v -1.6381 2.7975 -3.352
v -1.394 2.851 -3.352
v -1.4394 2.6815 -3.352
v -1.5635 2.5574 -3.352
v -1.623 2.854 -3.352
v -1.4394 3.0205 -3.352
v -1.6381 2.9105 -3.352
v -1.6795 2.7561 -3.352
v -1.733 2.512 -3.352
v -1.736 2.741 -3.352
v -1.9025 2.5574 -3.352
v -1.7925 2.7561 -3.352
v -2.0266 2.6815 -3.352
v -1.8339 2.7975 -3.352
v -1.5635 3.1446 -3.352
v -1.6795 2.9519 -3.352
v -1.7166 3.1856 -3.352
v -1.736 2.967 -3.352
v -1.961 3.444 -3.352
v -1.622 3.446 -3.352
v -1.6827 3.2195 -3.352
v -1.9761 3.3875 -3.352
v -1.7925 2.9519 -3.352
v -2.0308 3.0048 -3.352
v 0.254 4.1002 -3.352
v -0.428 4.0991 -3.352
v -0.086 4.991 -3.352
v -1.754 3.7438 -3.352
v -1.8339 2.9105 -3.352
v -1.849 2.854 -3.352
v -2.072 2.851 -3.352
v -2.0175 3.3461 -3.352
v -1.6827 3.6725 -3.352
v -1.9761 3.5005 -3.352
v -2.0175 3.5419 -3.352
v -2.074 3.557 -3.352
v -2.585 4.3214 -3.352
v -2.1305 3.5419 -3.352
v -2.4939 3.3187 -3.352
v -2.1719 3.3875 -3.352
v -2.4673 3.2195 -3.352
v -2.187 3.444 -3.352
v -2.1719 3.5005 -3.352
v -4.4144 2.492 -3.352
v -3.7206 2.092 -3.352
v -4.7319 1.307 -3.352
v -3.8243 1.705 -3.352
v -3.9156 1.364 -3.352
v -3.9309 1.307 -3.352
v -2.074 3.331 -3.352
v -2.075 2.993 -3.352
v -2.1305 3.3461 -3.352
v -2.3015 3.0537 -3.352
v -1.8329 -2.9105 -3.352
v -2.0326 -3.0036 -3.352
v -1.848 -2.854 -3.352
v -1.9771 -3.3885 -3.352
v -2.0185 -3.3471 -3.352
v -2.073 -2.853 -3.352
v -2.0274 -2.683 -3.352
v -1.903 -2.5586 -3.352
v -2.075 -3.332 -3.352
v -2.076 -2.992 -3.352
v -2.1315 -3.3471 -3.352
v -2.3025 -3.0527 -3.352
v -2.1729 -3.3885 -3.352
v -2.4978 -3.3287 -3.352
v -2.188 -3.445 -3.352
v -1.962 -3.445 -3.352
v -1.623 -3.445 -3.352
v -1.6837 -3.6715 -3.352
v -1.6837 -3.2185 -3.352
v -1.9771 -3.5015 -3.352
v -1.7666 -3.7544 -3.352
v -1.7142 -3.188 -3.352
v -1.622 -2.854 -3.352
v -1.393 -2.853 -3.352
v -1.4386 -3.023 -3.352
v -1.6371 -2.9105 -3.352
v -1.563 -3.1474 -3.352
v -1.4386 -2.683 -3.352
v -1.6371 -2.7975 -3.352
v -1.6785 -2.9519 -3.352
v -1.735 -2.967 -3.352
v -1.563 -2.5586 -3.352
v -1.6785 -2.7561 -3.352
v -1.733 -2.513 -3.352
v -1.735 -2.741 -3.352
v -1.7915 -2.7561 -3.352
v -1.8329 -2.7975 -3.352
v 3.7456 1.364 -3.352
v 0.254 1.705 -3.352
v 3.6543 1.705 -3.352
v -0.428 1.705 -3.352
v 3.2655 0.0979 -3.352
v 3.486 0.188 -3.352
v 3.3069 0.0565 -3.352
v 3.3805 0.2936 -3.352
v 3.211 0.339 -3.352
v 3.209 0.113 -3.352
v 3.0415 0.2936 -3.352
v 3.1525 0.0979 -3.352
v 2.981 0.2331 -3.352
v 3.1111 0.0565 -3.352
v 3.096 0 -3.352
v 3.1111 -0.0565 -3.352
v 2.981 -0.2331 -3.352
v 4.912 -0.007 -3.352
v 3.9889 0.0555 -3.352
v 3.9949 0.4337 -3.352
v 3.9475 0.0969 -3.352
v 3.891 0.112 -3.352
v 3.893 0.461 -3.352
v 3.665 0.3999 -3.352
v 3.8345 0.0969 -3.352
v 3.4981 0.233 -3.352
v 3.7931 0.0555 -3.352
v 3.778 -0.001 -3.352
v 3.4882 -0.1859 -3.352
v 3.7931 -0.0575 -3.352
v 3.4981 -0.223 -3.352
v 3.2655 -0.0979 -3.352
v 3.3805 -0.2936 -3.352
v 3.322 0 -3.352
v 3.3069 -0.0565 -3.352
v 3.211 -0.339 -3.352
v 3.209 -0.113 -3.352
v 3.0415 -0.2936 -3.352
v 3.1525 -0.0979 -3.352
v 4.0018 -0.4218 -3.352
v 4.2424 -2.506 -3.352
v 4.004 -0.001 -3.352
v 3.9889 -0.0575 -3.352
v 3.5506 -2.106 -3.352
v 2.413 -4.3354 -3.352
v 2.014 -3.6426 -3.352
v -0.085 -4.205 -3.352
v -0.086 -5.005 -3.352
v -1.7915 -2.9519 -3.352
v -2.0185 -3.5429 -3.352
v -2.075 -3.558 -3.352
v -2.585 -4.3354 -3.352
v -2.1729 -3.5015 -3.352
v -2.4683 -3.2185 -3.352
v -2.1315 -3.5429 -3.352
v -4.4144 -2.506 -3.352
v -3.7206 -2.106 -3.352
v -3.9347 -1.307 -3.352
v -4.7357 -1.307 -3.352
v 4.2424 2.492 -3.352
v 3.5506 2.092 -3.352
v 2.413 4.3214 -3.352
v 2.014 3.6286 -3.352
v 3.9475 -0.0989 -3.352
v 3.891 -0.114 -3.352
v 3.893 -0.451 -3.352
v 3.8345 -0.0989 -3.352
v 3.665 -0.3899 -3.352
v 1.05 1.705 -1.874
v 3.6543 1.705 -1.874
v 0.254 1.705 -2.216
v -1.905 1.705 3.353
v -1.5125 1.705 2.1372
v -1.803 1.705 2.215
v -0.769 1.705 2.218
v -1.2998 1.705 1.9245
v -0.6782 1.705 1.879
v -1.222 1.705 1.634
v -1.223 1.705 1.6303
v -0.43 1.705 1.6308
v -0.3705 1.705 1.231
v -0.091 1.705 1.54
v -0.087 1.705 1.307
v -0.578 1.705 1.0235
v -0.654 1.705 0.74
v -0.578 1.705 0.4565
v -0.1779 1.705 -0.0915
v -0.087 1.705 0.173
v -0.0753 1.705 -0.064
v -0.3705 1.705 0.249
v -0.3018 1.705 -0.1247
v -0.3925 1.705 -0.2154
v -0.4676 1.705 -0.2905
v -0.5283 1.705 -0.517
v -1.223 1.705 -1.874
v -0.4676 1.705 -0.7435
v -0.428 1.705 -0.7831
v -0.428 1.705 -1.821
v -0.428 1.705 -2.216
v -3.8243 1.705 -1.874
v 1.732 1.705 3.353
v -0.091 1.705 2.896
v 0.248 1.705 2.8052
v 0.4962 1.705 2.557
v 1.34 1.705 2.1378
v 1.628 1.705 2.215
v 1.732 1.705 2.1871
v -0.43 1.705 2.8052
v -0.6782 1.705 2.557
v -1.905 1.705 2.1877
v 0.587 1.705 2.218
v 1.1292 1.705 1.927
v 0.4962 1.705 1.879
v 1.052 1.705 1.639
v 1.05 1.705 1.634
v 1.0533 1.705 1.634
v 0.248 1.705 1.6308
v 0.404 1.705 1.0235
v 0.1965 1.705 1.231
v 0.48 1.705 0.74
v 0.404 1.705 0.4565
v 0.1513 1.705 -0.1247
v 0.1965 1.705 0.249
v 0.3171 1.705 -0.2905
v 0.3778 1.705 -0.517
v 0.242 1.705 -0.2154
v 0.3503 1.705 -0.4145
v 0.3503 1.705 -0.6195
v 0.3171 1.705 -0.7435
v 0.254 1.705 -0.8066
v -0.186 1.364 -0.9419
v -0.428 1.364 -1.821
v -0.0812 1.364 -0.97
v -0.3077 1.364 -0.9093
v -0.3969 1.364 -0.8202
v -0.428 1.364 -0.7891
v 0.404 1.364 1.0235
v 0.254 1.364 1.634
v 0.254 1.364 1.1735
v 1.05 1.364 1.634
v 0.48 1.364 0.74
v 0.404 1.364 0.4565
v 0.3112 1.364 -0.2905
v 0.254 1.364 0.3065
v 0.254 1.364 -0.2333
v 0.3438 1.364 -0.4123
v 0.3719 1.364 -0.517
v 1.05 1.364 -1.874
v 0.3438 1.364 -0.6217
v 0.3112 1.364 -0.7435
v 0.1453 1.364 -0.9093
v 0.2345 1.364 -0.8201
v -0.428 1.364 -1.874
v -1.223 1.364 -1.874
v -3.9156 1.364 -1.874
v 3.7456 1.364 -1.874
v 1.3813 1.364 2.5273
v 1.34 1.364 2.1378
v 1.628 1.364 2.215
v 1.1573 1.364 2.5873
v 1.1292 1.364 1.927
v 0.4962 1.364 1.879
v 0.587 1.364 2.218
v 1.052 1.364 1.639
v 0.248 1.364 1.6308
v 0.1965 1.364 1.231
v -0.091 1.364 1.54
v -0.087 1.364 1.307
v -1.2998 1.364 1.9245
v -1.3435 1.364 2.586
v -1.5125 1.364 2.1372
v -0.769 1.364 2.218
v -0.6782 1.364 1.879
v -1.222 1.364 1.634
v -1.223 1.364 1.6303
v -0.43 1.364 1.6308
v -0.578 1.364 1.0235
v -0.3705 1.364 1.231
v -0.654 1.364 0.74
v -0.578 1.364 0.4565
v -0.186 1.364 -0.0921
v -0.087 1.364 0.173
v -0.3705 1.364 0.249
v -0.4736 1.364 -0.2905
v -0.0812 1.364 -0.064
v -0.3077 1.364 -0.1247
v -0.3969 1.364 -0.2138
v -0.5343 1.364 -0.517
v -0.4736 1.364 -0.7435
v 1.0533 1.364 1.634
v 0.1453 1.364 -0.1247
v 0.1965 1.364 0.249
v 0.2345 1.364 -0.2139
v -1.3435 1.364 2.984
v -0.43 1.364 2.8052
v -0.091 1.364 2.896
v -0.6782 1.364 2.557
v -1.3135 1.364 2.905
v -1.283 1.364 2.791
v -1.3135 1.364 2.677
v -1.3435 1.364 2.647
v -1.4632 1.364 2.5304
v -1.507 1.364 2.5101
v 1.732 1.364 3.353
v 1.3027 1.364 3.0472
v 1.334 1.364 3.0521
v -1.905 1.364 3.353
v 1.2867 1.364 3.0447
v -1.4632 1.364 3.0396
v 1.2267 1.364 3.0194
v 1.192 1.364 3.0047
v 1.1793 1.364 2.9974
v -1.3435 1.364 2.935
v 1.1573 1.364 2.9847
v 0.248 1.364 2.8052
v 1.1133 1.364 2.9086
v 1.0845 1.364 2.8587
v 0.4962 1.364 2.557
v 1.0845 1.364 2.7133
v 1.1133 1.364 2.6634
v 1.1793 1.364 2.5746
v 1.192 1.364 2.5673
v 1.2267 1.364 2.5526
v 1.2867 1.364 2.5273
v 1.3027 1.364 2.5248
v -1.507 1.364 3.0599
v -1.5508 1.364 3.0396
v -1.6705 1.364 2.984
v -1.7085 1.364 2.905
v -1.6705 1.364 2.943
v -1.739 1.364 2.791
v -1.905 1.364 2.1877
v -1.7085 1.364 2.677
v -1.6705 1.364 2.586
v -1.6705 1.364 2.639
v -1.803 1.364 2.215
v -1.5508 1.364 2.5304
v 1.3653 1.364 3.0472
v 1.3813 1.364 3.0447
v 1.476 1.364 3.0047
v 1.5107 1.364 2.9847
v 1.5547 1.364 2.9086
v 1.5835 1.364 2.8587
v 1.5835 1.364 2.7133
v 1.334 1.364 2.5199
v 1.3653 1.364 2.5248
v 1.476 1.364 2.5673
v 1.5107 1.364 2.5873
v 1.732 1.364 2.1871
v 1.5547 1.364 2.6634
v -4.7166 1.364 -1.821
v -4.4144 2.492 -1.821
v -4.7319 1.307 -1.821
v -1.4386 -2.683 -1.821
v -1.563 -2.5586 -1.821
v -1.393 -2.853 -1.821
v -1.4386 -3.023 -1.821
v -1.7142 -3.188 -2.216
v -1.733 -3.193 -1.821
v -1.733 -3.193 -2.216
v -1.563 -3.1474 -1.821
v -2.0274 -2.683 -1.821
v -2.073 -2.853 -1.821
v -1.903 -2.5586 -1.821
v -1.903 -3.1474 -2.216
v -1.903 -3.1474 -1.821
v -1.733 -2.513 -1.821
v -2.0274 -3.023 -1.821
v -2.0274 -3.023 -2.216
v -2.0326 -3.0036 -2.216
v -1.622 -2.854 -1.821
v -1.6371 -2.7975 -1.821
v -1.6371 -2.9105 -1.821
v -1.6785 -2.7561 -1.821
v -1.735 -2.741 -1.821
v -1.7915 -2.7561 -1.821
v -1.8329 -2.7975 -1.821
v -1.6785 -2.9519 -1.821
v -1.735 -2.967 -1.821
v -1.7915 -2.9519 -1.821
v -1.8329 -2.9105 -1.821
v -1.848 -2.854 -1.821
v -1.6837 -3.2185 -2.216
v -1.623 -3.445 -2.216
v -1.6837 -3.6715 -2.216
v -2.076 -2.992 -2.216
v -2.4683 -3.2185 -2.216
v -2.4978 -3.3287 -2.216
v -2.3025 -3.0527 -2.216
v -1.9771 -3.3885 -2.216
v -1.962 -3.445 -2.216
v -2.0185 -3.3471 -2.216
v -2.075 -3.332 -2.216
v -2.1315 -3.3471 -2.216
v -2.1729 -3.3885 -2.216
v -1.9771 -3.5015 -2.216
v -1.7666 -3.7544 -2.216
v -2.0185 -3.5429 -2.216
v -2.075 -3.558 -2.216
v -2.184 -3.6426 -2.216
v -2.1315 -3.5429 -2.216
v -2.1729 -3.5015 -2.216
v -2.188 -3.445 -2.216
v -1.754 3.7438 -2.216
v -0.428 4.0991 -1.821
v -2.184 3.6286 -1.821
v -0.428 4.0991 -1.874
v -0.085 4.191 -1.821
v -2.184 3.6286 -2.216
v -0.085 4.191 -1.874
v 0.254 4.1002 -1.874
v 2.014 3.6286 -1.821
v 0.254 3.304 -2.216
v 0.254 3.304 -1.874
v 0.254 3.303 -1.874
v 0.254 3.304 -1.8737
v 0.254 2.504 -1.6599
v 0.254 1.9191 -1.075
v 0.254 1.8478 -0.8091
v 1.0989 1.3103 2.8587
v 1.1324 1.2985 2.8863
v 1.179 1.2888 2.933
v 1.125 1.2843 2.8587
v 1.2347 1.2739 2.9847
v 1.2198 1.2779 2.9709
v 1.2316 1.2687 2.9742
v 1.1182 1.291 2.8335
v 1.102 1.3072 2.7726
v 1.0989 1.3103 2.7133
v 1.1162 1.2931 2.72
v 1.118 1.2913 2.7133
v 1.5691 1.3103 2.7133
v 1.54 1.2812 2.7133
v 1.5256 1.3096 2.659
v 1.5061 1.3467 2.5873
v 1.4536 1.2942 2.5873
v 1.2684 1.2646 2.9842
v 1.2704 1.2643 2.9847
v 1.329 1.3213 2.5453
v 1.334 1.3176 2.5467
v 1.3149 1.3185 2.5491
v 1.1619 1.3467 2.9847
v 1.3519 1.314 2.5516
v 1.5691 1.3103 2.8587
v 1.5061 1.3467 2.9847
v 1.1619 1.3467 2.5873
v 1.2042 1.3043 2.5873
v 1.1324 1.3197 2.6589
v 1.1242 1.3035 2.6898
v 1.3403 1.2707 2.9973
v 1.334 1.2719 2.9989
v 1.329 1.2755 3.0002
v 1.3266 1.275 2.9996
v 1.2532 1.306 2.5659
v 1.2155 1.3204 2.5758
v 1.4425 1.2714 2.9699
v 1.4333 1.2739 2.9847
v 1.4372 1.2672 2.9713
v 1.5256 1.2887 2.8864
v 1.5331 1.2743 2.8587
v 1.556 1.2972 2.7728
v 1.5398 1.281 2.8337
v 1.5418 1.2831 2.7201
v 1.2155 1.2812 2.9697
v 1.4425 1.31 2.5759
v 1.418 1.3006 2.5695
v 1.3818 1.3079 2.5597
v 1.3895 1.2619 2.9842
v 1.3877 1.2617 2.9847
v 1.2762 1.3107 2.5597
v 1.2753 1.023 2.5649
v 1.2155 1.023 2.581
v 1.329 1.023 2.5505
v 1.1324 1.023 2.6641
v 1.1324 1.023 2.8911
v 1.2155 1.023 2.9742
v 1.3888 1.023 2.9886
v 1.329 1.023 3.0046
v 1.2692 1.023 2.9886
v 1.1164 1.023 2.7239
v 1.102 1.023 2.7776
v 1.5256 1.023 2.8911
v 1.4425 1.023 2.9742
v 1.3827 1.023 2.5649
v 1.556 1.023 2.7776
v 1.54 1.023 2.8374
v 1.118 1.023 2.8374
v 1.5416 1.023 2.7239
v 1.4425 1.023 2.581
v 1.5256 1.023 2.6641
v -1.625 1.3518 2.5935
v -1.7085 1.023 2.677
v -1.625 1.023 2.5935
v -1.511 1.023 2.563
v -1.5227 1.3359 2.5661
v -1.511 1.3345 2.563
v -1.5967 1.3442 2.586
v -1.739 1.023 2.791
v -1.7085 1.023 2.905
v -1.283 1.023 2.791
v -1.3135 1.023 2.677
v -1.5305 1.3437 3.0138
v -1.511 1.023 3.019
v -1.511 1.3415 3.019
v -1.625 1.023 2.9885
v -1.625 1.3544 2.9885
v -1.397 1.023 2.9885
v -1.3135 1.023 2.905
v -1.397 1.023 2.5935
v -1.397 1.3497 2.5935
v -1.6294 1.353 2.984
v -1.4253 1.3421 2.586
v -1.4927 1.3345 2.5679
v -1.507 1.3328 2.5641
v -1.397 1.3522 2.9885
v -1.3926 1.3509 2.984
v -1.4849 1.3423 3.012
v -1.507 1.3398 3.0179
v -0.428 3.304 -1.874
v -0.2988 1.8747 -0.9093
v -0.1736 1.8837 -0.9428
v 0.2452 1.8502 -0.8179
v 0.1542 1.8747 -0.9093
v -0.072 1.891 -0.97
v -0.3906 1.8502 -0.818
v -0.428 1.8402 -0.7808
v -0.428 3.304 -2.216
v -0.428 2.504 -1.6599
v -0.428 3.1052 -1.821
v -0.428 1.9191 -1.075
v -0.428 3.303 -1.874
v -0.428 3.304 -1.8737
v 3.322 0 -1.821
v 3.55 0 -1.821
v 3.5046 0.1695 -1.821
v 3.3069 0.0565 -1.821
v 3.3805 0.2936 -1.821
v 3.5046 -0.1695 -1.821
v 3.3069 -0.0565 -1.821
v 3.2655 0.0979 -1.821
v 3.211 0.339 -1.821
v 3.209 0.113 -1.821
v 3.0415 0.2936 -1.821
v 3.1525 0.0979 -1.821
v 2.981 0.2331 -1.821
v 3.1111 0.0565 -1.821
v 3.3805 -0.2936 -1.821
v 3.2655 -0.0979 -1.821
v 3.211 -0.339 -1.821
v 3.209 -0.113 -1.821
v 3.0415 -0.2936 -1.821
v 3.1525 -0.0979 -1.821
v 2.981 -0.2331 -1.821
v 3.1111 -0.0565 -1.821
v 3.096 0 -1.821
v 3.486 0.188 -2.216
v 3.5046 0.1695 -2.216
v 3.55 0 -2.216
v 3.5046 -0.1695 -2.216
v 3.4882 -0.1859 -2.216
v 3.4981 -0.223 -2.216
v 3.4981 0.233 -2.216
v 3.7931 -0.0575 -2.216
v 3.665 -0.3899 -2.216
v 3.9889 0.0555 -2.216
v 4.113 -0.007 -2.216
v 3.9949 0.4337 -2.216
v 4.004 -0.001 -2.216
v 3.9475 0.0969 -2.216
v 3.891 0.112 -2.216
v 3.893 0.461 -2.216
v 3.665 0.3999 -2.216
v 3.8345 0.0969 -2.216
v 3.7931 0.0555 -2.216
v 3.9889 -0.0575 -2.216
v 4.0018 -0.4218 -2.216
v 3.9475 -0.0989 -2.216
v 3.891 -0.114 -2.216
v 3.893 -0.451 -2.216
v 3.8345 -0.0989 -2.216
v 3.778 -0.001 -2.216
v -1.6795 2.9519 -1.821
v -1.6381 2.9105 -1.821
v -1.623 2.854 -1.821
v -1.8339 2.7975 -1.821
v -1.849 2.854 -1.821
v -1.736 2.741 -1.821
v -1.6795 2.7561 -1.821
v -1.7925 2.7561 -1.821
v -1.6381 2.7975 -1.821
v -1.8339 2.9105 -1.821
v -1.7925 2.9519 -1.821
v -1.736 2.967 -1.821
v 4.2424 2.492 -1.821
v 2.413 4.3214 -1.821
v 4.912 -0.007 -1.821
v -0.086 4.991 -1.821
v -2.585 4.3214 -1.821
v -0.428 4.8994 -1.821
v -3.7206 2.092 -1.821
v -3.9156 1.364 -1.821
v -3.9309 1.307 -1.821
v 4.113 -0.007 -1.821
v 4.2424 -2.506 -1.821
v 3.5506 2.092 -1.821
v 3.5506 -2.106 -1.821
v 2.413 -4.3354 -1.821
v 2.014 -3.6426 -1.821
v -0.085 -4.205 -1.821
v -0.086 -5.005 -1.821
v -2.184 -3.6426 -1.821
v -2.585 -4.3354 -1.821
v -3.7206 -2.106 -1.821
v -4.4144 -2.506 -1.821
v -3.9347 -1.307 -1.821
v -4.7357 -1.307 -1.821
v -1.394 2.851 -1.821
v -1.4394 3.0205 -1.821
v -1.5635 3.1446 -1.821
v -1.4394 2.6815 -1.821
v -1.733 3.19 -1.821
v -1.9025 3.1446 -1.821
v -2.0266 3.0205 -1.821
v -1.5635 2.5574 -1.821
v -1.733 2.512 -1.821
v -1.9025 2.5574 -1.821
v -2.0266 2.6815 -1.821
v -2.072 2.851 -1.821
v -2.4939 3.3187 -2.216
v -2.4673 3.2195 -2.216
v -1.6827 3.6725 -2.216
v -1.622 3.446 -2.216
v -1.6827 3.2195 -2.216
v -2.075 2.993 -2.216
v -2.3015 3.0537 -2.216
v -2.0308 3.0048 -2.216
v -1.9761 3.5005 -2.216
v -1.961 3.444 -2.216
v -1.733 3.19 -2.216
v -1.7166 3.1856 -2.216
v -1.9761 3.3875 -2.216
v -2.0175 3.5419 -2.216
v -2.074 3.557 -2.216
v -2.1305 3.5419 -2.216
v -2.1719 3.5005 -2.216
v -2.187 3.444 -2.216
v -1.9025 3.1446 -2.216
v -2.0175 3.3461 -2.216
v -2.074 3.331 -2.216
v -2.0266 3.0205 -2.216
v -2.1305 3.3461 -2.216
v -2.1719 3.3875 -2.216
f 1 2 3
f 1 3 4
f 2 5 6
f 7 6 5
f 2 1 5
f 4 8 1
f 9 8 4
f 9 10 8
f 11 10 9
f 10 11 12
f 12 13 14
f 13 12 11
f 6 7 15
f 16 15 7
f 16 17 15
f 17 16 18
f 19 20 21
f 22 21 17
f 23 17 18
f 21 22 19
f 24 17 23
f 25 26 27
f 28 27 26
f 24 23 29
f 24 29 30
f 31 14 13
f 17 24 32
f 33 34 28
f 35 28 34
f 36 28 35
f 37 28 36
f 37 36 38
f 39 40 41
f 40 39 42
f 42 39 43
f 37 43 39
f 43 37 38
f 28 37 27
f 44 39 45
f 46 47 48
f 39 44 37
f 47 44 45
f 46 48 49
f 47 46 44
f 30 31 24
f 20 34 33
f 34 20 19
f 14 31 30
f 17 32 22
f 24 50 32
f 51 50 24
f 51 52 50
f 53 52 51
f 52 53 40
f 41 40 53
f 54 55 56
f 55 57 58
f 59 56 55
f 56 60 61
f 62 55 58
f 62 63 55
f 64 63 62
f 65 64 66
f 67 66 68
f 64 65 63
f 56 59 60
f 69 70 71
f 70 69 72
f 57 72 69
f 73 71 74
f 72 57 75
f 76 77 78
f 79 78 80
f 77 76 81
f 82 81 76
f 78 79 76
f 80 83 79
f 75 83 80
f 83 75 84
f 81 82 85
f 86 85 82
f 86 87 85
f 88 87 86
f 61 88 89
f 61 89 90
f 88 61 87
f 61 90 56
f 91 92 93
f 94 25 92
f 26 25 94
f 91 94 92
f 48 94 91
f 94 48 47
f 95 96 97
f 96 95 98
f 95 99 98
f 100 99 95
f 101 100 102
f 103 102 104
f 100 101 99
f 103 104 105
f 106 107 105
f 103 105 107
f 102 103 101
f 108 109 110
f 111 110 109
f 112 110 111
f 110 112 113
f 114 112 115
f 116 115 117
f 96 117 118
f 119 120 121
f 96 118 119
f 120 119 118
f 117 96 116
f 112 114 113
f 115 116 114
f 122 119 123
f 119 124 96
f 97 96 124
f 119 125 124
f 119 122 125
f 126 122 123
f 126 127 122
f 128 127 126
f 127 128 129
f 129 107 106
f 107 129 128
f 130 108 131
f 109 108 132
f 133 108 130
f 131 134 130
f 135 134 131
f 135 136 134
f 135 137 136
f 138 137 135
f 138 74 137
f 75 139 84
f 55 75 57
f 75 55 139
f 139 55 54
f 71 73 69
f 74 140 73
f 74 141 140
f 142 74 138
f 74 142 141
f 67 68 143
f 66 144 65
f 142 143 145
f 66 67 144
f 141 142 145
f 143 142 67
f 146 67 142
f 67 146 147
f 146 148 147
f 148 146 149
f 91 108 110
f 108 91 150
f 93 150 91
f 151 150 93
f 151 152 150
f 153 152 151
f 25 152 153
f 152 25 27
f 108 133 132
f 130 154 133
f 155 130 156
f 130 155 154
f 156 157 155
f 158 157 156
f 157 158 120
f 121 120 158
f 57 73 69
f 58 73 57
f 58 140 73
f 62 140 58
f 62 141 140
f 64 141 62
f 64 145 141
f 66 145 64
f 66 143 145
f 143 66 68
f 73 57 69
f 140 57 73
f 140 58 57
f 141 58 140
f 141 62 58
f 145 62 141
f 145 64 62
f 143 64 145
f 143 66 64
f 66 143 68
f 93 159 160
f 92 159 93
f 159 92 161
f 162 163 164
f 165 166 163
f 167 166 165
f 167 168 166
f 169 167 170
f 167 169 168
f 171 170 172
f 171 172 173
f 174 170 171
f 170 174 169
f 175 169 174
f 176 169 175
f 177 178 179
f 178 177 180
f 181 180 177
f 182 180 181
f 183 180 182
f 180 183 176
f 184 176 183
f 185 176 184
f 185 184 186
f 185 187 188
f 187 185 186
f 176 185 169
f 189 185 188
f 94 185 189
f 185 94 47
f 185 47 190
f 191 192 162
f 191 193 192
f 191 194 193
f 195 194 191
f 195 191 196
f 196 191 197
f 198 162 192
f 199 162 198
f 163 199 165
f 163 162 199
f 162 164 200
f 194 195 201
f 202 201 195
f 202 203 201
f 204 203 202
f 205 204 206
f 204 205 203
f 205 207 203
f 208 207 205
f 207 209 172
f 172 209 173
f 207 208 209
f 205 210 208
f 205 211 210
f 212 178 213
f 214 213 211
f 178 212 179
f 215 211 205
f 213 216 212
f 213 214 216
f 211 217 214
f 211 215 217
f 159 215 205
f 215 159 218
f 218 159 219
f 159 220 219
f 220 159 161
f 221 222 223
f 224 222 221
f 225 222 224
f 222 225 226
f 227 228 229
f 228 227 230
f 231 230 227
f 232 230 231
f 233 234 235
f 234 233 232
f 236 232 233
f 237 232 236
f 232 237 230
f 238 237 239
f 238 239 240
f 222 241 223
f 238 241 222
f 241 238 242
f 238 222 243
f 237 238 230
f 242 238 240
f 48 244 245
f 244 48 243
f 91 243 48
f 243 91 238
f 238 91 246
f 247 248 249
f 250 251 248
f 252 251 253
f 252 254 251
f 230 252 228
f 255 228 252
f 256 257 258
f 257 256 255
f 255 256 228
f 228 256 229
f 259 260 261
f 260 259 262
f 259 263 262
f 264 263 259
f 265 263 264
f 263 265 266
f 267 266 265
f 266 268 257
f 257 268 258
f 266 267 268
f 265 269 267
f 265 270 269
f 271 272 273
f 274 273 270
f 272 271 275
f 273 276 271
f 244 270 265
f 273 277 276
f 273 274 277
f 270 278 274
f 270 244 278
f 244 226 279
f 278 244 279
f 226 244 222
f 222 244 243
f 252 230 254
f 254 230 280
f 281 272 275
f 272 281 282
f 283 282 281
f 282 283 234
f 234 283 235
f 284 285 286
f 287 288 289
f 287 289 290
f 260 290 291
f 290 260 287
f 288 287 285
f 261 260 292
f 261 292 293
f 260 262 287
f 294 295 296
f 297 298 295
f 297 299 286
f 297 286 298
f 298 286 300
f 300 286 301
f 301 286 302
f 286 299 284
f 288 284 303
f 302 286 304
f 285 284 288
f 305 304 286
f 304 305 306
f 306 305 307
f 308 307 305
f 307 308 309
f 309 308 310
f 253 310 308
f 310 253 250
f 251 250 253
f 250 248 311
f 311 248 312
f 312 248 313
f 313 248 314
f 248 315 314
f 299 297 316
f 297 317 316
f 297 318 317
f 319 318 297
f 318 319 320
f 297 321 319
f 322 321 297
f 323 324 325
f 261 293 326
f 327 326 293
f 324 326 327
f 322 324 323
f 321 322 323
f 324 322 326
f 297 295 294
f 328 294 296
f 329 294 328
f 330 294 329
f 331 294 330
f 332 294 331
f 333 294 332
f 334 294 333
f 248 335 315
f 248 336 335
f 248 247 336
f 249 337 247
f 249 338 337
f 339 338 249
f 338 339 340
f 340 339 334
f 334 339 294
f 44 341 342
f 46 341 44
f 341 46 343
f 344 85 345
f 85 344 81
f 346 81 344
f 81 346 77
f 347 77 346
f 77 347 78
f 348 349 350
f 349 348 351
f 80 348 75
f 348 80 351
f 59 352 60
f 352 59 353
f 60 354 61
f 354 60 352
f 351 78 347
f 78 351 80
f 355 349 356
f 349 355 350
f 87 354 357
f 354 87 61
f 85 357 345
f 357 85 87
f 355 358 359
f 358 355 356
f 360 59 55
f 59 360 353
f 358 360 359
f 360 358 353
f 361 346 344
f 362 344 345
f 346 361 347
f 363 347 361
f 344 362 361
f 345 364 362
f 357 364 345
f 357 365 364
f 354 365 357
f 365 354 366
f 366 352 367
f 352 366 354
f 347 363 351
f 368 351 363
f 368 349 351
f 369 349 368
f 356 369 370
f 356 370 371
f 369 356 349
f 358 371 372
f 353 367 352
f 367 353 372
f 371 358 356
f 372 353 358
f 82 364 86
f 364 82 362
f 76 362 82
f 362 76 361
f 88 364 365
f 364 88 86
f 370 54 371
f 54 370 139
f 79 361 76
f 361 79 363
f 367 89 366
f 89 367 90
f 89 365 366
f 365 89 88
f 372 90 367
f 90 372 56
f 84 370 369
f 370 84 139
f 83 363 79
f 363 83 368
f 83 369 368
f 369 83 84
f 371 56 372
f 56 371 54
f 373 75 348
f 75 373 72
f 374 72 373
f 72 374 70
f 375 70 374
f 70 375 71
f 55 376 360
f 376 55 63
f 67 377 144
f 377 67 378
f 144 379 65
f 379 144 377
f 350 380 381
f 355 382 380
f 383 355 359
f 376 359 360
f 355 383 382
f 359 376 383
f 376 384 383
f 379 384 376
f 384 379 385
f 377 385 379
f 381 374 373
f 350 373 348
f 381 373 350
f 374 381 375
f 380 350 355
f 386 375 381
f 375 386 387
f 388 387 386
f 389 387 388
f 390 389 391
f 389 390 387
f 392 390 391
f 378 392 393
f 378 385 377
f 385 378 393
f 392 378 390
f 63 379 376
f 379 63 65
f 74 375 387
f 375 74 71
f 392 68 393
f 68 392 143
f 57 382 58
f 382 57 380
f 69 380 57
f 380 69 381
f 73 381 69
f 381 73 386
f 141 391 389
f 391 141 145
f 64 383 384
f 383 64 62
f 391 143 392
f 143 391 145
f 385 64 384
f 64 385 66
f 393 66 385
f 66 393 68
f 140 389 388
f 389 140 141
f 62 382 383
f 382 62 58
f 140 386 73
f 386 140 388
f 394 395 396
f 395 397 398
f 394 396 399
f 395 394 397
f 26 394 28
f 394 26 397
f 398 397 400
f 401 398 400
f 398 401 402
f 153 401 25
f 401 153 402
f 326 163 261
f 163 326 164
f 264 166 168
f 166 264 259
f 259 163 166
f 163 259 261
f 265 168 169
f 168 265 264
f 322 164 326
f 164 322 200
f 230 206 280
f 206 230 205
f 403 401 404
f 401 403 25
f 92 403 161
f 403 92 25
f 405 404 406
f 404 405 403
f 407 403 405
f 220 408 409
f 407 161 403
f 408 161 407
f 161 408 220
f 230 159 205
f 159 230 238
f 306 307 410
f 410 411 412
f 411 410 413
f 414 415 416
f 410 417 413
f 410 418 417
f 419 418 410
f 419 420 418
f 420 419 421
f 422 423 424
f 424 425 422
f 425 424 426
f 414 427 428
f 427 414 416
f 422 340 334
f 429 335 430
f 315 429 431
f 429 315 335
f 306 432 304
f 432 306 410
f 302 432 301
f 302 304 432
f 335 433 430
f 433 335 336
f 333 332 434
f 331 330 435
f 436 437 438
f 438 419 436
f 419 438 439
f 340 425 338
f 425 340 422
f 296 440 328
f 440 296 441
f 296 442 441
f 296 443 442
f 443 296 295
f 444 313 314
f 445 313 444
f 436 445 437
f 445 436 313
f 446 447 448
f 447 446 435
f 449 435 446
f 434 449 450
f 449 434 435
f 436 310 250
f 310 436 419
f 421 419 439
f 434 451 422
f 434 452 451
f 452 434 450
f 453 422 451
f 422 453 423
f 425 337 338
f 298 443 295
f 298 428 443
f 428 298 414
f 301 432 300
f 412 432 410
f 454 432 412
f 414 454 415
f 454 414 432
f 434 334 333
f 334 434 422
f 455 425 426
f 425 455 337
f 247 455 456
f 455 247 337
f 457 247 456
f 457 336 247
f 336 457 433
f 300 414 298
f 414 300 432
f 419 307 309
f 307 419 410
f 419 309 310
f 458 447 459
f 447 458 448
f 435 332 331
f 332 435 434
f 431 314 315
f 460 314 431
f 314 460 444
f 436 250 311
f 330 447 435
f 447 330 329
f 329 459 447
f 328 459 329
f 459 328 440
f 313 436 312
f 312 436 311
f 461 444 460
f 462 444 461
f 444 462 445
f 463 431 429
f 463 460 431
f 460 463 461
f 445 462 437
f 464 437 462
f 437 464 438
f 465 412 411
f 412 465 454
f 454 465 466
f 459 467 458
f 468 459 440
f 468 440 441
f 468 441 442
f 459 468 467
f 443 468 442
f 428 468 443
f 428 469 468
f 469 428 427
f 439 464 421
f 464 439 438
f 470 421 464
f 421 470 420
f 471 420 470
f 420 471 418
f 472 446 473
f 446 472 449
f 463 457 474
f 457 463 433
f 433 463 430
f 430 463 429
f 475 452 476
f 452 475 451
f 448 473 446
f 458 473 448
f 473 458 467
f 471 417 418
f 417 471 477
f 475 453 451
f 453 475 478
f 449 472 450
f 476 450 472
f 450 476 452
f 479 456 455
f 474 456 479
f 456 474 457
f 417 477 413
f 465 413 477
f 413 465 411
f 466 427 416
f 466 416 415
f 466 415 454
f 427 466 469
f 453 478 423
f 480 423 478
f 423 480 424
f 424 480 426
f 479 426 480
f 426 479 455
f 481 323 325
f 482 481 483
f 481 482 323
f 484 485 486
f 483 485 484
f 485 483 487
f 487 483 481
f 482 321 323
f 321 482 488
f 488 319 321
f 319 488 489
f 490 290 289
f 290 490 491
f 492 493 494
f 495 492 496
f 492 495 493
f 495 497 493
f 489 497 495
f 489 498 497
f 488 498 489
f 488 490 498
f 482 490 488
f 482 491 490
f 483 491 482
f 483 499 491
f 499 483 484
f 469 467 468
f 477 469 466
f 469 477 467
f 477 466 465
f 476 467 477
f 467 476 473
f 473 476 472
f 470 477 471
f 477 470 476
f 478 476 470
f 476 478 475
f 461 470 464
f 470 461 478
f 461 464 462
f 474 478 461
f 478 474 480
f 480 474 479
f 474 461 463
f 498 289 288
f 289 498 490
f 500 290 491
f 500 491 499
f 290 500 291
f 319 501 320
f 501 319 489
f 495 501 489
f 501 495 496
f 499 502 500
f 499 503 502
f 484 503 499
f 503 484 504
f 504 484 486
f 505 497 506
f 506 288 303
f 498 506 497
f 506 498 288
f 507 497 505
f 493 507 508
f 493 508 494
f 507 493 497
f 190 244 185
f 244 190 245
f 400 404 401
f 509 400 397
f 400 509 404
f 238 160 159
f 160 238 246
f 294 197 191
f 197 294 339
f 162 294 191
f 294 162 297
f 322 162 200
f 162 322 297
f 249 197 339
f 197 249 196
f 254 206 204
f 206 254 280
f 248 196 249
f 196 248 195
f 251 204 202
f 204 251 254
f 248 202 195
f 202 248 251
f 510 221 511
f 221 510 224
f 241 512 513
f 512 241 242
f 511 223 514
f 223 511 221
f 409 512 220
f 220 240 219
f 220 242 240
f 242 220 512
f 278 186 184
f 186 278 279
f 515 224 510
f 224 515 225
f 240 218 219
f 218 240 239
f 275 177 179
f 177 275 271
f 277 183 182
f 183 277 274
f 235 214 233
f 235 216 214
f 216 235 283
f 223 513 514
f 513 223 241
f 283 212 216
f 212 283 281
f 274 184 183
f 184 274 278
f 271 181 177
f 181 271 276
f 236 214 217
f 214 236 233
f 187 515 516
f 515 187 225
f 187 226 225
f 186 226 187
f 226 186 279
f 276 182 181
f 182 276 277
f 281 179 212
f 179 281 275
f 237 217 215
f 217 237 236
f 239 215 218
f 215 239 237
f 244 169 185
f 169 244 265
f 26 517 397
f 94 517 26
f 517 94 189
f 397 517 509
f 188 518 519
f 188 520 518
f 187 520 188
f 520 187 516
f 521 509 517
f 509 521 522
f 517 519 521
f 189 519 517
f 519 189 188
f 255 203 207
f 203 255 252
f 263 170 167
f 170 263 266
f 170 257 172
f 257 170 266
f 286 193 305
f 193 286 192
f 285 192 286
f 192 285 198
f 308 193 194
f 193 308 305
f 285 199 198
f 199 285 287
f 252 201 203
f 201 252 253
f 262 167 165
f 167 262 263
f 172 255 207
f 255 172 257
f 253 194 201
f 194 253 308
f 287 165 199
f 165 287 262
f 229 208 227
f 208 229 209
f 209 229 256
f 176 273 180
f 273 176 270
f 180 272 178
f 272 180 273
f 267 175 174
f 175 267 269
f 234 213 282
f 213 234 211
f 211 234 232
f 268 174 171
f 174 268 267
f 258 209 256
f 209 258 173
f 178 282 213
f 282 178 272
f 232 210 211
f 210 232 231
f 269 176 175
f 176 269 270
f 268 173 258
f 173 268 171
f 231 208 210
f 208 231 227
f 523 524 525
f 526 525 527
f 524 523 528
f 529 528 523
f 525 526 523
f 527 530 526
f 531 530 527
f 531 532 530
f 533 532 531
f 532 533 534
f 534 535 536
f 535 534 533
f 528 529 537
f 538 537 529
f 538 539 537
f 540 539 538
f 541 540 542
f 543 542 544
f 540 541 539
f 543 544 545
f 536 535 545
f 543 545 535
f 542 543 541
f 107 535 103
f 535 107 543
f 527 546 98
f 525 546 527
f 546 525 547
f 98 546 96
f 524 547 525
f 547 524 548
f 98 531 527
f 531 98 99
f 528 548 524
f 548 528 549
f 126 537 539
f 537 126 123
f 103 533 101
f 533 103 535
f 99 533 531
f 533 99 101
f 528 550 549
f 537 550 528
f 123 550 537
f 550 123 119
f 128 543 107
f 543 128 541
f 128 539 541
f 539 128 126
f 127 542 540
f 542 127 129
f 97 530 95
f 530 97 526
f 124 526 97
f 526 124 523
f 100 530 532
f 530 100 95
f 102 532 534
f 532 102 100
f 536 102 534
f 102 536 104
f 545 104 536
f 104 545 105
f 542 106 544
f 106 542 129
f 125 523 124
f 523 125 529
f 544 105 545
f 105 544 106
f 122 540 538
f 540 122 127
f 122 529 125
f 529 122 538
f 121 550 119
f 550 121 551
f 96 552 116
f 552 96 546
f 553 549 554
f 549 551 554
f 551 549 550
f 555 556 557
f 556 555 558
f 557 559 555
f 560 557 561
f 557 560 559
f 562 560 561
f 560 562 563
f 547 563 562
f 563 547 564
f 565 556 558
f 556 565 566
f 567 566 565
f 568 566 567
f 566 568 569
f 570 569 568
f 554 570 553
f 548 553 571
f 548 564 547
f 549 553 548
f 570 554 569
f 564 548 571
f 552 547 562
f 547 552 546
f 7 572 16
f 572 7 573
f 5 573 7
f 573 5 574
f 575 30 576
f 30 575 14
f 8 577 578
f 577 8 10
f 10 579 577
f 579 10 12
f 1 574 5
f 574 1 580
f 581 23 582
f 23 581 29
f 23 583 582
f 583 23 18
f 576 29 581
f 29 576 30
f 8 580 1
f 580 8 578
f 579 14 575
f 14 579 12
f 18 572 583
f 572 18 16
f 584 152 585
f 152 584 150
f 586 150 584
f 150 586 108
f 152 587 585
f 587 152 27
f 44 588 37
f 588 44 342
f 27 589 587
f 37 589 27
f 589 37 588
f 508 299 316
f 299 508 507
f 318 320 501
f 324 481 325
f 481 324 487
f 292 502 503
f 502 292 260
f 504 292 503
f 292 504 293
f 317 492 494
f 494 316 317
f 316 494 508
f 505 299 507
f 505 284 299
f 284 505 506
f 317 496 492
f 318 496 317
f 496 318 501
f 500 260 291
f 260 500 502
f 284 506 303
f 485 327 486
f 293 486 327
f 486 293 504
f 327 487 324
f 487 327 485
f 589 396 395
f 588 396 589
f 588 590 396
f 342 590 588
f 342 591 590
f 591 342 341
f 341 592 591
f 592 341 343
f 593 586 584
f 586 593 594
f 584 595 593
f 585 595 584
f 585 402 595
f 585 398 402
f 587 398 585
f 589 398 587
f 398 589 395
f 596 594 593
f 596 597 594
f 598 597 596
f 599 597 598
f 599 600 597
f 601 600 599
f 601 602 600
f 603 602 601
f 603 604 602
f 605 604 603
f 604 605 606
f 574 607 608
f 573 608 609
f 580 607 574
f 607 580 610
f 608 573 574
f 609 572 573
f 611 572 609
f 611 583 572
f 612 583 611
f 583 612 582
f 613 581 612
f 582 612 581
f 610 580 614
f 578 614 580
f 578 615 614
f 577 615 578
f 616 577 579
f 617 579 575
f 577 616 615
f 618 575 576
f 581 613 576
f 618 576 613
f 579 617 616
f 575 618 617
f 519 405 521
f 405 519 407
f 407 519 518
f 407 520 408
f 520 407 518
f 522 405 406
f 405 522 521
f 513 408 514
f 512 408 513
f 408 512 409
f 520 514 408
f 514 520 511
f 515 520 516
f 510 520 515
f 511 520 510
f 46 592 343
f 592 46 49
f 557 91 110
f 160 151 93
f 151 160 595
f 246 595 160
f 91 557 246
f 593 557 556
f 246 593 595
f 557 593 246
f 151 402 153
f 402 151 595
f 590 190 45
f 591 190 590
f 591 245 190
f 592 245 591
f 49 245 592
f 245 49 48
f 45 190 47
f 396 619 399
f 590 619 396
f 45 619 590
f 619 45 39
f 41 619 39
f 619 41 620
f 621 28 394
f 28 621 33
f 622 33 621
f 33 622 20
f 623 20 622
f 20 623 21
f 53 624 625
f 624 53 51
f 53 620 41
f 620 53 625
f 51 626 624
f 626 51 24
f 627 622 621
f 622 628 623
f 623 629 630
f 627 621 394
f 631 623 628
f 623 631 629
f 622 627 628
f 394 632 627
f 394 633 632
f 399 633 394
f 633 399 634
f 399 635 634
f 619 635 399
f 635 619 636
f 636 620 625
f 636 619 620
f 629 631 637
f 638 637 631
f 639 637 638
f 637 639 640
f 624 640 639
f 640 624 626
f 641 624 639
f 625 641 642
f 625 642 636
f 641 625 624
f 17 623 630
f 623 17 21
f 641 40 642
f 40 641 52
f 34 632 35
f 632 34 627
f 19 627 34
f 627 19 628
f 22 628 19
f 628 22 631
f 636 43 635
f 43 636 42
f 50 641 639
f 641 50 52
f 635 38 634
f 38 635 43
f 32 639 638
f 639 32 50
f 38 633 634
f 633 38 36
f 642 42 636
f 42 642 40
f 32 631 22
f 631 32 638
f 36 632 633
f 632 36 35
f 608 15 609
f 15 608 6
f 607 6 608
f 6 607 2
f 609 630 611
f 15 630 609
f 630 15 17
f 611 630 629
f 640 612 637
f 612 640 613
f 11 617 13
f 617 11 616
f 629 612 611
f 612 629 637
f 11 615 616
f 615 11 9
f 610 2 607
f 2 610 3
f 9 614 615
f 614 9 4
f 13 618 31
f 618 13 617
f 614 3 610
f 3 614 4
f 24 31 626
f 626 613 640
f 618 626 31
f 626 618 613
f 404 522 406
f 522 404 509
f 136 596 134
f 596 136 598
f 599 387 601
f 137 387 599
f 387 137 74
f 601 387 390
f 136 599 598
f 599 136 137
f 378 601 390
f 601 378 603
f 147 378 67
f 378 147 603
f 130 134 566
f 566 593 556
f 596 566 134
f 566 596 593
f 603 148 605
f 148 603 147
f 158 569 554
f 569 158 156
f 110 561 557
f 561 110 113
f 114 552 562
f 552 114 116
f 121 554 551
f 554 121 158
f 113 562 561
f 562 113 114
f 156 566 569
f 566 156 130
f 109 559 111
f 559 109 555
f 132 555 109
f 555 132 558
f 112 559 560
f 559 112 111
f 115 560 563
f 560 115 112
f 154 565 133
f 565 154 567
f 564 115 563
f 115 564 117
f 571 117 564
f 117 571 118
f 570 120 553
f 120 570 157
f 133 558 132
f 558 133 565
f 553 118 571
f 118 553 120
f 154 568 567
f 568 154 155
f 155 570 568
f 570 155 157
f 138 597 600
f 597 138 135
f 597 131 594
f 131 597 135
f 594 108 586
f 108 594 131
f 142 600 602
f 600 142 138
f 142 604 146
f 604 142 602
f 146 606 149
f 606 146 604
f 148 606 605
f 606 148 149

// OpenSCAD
intersection() {
translate([-5.896, -6, -4.023]) cube(size = [11.792, 12, 8.046], center = false);
union() {
intersection() {
translate([-0.086, -0.007, -3.352])
cylinder(h = 21.452, r1 = 4.998, r2 = 4.998, center = false, $fn = 12);
union() {
translate([-2.076, -3.445, -18.1])
cylinder(h = 14.748, r1 = 0.453, r2 = 0.453, center = false, $fn = 12);
translate([-18.1, 1.364, -18.1]) cube(size = [21.081, 0.341, 15.884], center = false);
}
}
difference() {
intersection() {
translate([-18.1, -18.1, -18.1]) cube(size = [36.2, 16.793, 16.279], center = false);
union() {
translate([3.893, 0.005, -3.352])
cylinder(h = 1.136, r1 = 0.456, r2 = 0.456, center = false, $fn = 12);
rotate([0, 0, 0])
translate([-1.733, -2.853, -3.352])
cylinder(h = 21.452, r1 = 0.34, r2 = 0.34, center = false, $fn = 12);
}
}
translate([-1.735, -2.854, -3.352])
cylinder(h = 1.531, r1 = 0.113, r2 = 0.113, center = false, $fn = 12);
}
difference() {
translate([-2.076, -3.445, -3.352])
cylinder(h = 1.136, r1 = 0.453, r2 = 0.453, center = false, $fn = 12);
translate([-2.075, -3.445, -18.1])
cylinder(h = 36.2, r1 = 0.113, r2 = 0.113, center = false, $fn = 12);
}
difference() {
difference() {
translate([-18.1, 1.705, -2.216]) cube(size = [21.081, 16.395, 0.395], center = false);
translate([3.209, 0, -3.352])
cylinder(h = 21.452, r1 = 0.113, r2 = 0.113, center = false, $fn = 12);
}
union() {
translate([-0.086, -0.007, -2.216])
cylinder(h = 0.342, r1 = 4.998, r2 = 4.998, center = false, $fn = 12);
translate([-18.1, -1.307, -3.352]) cube(size = [21.081, 19.407, 21.452], center = false);
}
}
difference() {
union() {
difference() {
difference() {
rotate([180, 0, 180])
translate([0.085, -0.007, -18.1])
cylinder(h = 21.452, r1 = 4.198, r2 = 4.198, center = false, $fn = 12);
rotate([180, 90, -90])
translate([-1.634, 1.803, -18.1])
cylinder(h = 36.2, r1 = 0.581, r2 = 0.581, center = false, $fn = 12);
}
union() {
translate([-18.1, -18.1, -18.1]) cube(size = [36.2, 19.464, 36.2], center = false);
translate([0.254, 1.364, -3.352]) cube(size = [17.846, 16.736, 4.986], center = false);
}
}
translate([0.254, 1.364, -3.352]) cube(size = [0.796, 0.341, 4.986], center = false);
translate([1.334, 1.446, 2.786]) sphere(r = 0.281, $fn = 12);
rotate([-180, 89, -90])
translate([-2.795, -1.329, -18.1])
cylinder(h = 36.2, r1 = 0.227, r2 = 0.227, center = false, $fn = 12);
rotate([180, 90, -90])
translate([-2.791, 1.511, 1.023])
cylinder(h = 17.077, r1 = 0.228, r2 = 0.228, center = false, $fn = 12);
}
union() {
difference() {
translate([-18.1, -18.1, -1.874]) cube(size = [36.2, 36.2, 19.974], center = false);
translate([-1.905, 1.023, -3.352]) cube(size = [3.637, 0.682, 6.705], center = false);
}
rotate([180, 90, -90])
translate([-1.639, -1.628, 1.364])
cylinder(h = 0.341, r1 = 0.576, r2 = 0.576, center = false, $fn = 12);
rotate([0, 90, 89])
translate([0.517, 0.105, -18.1])
cylinder(h = 36.2, r1 = 0.453, r2 = 0.453, center = false, $fn = 12);
translate([-1.905, -18.1, -1.874]) cube(size = [0.682, 19.805, 3.508], center = false);
translate([-18.1, 1.364, -3.352]) cube(size = [17.672, 16.736, 1.478], center = false);
rotate([180, 90, -90])
translate([-2.218, 0.091, -18.1])
cylinder(h = 19.805, r1 = 0.678, r2 = 0.678, center = false, $fn = 12);
rotate([180, 90, -90])
translate([-0.74, 0.087, 1.364])
cylinder(h = 0.341, r1 = 0.567, r2 = 0.567, center = false, $fn = 12);
}
}
difference() {
intersection() {
translate([2.981, -18.1, -3.352]) cube(size = [15.118, 36.2, 1.531], center = false);
rotate([0, 0, 0])
translate([3.211, 0, -18.1])
cylinder(h = 36.2, r1 = 0.339, r2 = 0.339, center = false, $fn = 12);
}
union() {
translate([3.209, 0, -3.352])
cylinder(h = 21.452, r1 = 0.113, r2 = 0.113, center = false, $fn = 12);
translate([3.893, 0.005, -3.352])
cylinder(h = 1.136, r1 = 0.456, r2 = 0.456, center = false, $fn = 12);
}
}
intersection() {
difference() {
difference() {
translate([-0.086, -0.007, -18.1])
cylinder(h = 21.452, r1 = 4.998, r2 = 4.998, center = false, $fn = 12);
union() {
translate([-1.736, 2.854, -18.1])
cylinder(h = 36.2, r1 = 0.113, r2 = 0.113, center = false, $fn = 12);
rotate([0, 90, 89])
translate([0.517, 0.105, -18.1])
cylinder(h = 36.2, r1 = 0.453, r2 = 0.453, center = false, $fn = 12);
}
}
union() {
difference() {
translate([-1.905, 1.307, 1.634]) cube(size = [20.005, 16.793, 1.719], center = false);
translate([-1.507, 2.063, 2.785]) sphere(r = 0.769, $fn = 12);
}
translate([-18.1, 1.364, -1.821]) cube(size = [17.672, 16.736, 5.174], center = false);
rotate([180, 90, 180])
translate([0.276, 3.303, -1.223])
cylinder(h = 2.955, r1 = 1.598, r2 = 1.598, center = false, $fn = 12);
}
}
union() {
difference() {
translate([-18.1, 1.307, -3.352]) cube(size = [36.2, 16.793, 1.531], center = false);
rotate([180, 0, 180])
translate([0.085, -0.007, -18.1])
cylinder(h = 36.2, r1 = 4.198, r2 = 4.198, center = false, $fn = 12);
}
difference() {
union() {
translate([-1.905, 1.307, 1.634]) cube(size = [3.637, 16.793, 1.719], center = false);
translate([-2.075, 3.446, -3.352])
cylinder(h = 1.136, r1 = 0.453, r2 = 0.453, center = false, $fn = 12);
}
translate([-2.074, 3.444, -18.1])
cylinder(h = 36.2, r1 = 0.113, r2 = 0.113, center = false, $fn = 12);
}
rotate([0, 0, 0])
translate([-1.733, 2.851, -3.352])
cylinder(h = 2.836, r1 = 0.339, r2 = 0.339, center = false, $fn = 12);
translate([-0.428, 1.364, -2.216]) cube(size = [0.682, 1.94, 1.699], center = false);
}
}
difference() {
union() {
difference() {
translate([-18.1, -18.1, -3.352]) cube(size = [36.2, 36.2, 21.452], center = false);
rotate([180, 0, 180])
translate([0.085, -0.007, 1.821])
cylinder(h = 16.279, r1 = 4.198, r2 = 4.198, center = false, $fn = 12);
}
difference() {
translate([3.893, 0.005, -3.352])
cylinder(h = 1.136, r1 = 0.456, r2 = 0.456, center = false, $fn = 12);
translate([3.891, -0.001, -18.1])
cylinder(h = 36.2, r1 = 0.113, r2 = 0.113, center = false, $fn = 12);
}
}
union() {
translate([-18.1, -1.307, -3.352]) cube(size = [21.081, 19.407, 1.531], center = false);
difference() {
translate([-18.1, -18.1, -3.352]) cube(size = [36.2, 36.2, 21.452], center = false);
translate([-0.086, -0.007, -18.1])
cylinder(h = 16.279, r1 = 4.998, r2 = 4.998, center = false, $fn = 12);
}
}
}
intersection() {
rotate([180, 0, 180])
translate([0.085, -0.007, 1.821])
cylinder(h = 16.279, r1 = 4.198, r2 = 4.198, center = false, $fn = 12);
translate([-18.1, 1.364, -3.352]) cube(size = [36.2, 0.341, 1.478], center = false);
}
}
}
